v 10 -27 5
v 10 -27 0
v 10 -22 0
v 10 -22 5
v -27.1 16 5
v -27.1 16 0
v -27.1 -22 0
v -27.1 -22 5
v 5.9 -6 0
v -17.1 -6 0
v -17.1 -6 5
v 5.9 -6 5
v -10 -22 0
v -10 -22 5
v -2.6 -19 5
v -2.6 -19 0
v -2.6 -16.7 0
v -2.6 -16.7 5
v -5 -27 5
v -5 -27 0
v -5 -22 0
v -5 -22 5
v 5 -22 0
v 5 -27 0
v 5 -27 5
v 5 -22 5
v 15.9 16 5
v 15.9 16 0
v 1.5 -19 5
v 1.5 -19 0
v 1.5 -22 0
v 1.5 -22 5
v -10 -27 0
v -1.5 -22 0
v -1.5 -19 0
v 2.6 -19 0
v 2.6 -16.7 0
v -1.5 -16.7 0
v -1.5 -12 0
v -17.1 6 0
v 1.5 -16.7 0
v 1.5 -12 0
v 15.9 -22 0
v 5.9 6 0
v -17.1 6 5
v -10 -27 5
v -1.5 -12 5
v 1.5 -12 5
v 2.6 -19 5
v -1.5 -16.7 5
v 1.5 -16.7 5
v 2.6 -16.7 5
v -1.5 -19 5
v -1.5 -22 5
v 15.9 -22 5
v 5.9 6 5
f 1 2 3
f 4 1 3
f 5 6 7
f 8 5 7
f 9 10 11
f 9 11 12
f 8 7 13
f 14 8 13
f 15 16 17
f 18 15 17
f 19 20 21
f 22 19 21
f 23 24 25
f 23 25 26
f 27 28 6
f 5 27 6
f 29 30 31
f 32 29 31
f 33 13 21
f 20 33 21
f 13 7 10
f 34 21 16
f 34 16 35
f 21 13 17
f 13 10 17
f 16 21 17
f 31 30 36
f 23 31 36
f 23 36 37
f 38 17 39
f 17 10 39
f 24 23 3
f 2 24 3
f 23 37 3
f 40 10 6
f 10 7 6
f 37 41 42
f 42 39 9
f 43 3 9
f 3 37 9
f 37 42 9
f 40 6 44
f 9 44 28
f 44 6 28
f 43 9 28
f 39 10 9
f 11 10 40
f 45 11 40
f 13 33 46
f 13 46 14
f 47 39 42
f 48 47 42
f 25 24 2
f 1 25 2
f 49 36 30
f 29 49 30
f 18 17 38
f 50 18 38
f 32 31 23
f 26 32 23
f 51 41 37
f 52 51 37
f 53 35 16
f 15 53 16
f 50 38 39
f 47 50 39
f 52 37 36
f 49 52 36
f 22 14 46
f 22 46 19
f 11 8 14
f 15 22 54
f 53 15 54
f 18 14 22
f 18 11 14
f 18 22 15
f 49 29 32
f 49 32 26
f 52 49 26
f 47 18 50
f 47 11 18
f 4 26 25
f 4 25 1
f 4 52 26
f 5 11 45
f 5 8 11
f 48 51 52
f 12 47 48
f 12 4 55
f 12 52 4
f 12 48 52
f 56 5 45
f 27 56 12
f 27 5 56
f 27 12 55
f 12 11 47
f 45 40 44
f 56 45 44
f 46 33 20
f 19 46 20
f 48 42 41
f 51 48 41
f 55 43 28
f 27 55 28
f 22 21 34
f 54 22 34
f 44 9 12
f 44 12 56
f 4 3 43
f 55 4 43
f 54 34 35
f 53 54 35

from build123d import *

# Parameters (mm, degrees)
SKETCH1_W           = 5
SKETCH1_H           = 5
SKETCH1_W_2         = 23
SKETCH1_H_2         = 12
BOSS_EXTRUDE3_DEPTH = 5


with BuildPart() as part:
    # Sketch1 → Boss-Extrude3 (new body)
    # profile 1 of 3: a face of its own
    with BuildSketch(Plane.XY):
        with Locations((-7.5, -24.5)):
            Rectangle(SKETCH1_W, SKETCH1_H)
    # profile 2 of 3: a face of its own
    with BuildSketch(Plane.XY):
        with Locations((7.5, -24.5)):
            Rectangle(SKETCH1_W, SKETCH1_H)
    # profile 3 of 3: a face of its own
    with BuildSketch(Plane.XY):
        Polygon((-27.1, 16), (-27.1, -22), (-10, -22), (-5, -22), (-1.5, -22), (-1.5, -19), (-2.6, -19), (-2.6, -16.7), (-1.5, -16.7), (-1.5, -12), (1.5, -12), (1.5, -16.7), (2.6, -16.7), (2.6, -19), (1.5, -19), (1.5, -22), (5, -22), (10, -22), (15.9, -22), (15.9, 16), align=None)
        with Locations((-5.6, 0)):
            Rectangle(SKETCH1_W_2, SKETCH1_H_2, mode=Mode.SUBTRACT)
    extrude(amount=BOSS_EXTRUDE3_DEPTH)


solid = part.part
